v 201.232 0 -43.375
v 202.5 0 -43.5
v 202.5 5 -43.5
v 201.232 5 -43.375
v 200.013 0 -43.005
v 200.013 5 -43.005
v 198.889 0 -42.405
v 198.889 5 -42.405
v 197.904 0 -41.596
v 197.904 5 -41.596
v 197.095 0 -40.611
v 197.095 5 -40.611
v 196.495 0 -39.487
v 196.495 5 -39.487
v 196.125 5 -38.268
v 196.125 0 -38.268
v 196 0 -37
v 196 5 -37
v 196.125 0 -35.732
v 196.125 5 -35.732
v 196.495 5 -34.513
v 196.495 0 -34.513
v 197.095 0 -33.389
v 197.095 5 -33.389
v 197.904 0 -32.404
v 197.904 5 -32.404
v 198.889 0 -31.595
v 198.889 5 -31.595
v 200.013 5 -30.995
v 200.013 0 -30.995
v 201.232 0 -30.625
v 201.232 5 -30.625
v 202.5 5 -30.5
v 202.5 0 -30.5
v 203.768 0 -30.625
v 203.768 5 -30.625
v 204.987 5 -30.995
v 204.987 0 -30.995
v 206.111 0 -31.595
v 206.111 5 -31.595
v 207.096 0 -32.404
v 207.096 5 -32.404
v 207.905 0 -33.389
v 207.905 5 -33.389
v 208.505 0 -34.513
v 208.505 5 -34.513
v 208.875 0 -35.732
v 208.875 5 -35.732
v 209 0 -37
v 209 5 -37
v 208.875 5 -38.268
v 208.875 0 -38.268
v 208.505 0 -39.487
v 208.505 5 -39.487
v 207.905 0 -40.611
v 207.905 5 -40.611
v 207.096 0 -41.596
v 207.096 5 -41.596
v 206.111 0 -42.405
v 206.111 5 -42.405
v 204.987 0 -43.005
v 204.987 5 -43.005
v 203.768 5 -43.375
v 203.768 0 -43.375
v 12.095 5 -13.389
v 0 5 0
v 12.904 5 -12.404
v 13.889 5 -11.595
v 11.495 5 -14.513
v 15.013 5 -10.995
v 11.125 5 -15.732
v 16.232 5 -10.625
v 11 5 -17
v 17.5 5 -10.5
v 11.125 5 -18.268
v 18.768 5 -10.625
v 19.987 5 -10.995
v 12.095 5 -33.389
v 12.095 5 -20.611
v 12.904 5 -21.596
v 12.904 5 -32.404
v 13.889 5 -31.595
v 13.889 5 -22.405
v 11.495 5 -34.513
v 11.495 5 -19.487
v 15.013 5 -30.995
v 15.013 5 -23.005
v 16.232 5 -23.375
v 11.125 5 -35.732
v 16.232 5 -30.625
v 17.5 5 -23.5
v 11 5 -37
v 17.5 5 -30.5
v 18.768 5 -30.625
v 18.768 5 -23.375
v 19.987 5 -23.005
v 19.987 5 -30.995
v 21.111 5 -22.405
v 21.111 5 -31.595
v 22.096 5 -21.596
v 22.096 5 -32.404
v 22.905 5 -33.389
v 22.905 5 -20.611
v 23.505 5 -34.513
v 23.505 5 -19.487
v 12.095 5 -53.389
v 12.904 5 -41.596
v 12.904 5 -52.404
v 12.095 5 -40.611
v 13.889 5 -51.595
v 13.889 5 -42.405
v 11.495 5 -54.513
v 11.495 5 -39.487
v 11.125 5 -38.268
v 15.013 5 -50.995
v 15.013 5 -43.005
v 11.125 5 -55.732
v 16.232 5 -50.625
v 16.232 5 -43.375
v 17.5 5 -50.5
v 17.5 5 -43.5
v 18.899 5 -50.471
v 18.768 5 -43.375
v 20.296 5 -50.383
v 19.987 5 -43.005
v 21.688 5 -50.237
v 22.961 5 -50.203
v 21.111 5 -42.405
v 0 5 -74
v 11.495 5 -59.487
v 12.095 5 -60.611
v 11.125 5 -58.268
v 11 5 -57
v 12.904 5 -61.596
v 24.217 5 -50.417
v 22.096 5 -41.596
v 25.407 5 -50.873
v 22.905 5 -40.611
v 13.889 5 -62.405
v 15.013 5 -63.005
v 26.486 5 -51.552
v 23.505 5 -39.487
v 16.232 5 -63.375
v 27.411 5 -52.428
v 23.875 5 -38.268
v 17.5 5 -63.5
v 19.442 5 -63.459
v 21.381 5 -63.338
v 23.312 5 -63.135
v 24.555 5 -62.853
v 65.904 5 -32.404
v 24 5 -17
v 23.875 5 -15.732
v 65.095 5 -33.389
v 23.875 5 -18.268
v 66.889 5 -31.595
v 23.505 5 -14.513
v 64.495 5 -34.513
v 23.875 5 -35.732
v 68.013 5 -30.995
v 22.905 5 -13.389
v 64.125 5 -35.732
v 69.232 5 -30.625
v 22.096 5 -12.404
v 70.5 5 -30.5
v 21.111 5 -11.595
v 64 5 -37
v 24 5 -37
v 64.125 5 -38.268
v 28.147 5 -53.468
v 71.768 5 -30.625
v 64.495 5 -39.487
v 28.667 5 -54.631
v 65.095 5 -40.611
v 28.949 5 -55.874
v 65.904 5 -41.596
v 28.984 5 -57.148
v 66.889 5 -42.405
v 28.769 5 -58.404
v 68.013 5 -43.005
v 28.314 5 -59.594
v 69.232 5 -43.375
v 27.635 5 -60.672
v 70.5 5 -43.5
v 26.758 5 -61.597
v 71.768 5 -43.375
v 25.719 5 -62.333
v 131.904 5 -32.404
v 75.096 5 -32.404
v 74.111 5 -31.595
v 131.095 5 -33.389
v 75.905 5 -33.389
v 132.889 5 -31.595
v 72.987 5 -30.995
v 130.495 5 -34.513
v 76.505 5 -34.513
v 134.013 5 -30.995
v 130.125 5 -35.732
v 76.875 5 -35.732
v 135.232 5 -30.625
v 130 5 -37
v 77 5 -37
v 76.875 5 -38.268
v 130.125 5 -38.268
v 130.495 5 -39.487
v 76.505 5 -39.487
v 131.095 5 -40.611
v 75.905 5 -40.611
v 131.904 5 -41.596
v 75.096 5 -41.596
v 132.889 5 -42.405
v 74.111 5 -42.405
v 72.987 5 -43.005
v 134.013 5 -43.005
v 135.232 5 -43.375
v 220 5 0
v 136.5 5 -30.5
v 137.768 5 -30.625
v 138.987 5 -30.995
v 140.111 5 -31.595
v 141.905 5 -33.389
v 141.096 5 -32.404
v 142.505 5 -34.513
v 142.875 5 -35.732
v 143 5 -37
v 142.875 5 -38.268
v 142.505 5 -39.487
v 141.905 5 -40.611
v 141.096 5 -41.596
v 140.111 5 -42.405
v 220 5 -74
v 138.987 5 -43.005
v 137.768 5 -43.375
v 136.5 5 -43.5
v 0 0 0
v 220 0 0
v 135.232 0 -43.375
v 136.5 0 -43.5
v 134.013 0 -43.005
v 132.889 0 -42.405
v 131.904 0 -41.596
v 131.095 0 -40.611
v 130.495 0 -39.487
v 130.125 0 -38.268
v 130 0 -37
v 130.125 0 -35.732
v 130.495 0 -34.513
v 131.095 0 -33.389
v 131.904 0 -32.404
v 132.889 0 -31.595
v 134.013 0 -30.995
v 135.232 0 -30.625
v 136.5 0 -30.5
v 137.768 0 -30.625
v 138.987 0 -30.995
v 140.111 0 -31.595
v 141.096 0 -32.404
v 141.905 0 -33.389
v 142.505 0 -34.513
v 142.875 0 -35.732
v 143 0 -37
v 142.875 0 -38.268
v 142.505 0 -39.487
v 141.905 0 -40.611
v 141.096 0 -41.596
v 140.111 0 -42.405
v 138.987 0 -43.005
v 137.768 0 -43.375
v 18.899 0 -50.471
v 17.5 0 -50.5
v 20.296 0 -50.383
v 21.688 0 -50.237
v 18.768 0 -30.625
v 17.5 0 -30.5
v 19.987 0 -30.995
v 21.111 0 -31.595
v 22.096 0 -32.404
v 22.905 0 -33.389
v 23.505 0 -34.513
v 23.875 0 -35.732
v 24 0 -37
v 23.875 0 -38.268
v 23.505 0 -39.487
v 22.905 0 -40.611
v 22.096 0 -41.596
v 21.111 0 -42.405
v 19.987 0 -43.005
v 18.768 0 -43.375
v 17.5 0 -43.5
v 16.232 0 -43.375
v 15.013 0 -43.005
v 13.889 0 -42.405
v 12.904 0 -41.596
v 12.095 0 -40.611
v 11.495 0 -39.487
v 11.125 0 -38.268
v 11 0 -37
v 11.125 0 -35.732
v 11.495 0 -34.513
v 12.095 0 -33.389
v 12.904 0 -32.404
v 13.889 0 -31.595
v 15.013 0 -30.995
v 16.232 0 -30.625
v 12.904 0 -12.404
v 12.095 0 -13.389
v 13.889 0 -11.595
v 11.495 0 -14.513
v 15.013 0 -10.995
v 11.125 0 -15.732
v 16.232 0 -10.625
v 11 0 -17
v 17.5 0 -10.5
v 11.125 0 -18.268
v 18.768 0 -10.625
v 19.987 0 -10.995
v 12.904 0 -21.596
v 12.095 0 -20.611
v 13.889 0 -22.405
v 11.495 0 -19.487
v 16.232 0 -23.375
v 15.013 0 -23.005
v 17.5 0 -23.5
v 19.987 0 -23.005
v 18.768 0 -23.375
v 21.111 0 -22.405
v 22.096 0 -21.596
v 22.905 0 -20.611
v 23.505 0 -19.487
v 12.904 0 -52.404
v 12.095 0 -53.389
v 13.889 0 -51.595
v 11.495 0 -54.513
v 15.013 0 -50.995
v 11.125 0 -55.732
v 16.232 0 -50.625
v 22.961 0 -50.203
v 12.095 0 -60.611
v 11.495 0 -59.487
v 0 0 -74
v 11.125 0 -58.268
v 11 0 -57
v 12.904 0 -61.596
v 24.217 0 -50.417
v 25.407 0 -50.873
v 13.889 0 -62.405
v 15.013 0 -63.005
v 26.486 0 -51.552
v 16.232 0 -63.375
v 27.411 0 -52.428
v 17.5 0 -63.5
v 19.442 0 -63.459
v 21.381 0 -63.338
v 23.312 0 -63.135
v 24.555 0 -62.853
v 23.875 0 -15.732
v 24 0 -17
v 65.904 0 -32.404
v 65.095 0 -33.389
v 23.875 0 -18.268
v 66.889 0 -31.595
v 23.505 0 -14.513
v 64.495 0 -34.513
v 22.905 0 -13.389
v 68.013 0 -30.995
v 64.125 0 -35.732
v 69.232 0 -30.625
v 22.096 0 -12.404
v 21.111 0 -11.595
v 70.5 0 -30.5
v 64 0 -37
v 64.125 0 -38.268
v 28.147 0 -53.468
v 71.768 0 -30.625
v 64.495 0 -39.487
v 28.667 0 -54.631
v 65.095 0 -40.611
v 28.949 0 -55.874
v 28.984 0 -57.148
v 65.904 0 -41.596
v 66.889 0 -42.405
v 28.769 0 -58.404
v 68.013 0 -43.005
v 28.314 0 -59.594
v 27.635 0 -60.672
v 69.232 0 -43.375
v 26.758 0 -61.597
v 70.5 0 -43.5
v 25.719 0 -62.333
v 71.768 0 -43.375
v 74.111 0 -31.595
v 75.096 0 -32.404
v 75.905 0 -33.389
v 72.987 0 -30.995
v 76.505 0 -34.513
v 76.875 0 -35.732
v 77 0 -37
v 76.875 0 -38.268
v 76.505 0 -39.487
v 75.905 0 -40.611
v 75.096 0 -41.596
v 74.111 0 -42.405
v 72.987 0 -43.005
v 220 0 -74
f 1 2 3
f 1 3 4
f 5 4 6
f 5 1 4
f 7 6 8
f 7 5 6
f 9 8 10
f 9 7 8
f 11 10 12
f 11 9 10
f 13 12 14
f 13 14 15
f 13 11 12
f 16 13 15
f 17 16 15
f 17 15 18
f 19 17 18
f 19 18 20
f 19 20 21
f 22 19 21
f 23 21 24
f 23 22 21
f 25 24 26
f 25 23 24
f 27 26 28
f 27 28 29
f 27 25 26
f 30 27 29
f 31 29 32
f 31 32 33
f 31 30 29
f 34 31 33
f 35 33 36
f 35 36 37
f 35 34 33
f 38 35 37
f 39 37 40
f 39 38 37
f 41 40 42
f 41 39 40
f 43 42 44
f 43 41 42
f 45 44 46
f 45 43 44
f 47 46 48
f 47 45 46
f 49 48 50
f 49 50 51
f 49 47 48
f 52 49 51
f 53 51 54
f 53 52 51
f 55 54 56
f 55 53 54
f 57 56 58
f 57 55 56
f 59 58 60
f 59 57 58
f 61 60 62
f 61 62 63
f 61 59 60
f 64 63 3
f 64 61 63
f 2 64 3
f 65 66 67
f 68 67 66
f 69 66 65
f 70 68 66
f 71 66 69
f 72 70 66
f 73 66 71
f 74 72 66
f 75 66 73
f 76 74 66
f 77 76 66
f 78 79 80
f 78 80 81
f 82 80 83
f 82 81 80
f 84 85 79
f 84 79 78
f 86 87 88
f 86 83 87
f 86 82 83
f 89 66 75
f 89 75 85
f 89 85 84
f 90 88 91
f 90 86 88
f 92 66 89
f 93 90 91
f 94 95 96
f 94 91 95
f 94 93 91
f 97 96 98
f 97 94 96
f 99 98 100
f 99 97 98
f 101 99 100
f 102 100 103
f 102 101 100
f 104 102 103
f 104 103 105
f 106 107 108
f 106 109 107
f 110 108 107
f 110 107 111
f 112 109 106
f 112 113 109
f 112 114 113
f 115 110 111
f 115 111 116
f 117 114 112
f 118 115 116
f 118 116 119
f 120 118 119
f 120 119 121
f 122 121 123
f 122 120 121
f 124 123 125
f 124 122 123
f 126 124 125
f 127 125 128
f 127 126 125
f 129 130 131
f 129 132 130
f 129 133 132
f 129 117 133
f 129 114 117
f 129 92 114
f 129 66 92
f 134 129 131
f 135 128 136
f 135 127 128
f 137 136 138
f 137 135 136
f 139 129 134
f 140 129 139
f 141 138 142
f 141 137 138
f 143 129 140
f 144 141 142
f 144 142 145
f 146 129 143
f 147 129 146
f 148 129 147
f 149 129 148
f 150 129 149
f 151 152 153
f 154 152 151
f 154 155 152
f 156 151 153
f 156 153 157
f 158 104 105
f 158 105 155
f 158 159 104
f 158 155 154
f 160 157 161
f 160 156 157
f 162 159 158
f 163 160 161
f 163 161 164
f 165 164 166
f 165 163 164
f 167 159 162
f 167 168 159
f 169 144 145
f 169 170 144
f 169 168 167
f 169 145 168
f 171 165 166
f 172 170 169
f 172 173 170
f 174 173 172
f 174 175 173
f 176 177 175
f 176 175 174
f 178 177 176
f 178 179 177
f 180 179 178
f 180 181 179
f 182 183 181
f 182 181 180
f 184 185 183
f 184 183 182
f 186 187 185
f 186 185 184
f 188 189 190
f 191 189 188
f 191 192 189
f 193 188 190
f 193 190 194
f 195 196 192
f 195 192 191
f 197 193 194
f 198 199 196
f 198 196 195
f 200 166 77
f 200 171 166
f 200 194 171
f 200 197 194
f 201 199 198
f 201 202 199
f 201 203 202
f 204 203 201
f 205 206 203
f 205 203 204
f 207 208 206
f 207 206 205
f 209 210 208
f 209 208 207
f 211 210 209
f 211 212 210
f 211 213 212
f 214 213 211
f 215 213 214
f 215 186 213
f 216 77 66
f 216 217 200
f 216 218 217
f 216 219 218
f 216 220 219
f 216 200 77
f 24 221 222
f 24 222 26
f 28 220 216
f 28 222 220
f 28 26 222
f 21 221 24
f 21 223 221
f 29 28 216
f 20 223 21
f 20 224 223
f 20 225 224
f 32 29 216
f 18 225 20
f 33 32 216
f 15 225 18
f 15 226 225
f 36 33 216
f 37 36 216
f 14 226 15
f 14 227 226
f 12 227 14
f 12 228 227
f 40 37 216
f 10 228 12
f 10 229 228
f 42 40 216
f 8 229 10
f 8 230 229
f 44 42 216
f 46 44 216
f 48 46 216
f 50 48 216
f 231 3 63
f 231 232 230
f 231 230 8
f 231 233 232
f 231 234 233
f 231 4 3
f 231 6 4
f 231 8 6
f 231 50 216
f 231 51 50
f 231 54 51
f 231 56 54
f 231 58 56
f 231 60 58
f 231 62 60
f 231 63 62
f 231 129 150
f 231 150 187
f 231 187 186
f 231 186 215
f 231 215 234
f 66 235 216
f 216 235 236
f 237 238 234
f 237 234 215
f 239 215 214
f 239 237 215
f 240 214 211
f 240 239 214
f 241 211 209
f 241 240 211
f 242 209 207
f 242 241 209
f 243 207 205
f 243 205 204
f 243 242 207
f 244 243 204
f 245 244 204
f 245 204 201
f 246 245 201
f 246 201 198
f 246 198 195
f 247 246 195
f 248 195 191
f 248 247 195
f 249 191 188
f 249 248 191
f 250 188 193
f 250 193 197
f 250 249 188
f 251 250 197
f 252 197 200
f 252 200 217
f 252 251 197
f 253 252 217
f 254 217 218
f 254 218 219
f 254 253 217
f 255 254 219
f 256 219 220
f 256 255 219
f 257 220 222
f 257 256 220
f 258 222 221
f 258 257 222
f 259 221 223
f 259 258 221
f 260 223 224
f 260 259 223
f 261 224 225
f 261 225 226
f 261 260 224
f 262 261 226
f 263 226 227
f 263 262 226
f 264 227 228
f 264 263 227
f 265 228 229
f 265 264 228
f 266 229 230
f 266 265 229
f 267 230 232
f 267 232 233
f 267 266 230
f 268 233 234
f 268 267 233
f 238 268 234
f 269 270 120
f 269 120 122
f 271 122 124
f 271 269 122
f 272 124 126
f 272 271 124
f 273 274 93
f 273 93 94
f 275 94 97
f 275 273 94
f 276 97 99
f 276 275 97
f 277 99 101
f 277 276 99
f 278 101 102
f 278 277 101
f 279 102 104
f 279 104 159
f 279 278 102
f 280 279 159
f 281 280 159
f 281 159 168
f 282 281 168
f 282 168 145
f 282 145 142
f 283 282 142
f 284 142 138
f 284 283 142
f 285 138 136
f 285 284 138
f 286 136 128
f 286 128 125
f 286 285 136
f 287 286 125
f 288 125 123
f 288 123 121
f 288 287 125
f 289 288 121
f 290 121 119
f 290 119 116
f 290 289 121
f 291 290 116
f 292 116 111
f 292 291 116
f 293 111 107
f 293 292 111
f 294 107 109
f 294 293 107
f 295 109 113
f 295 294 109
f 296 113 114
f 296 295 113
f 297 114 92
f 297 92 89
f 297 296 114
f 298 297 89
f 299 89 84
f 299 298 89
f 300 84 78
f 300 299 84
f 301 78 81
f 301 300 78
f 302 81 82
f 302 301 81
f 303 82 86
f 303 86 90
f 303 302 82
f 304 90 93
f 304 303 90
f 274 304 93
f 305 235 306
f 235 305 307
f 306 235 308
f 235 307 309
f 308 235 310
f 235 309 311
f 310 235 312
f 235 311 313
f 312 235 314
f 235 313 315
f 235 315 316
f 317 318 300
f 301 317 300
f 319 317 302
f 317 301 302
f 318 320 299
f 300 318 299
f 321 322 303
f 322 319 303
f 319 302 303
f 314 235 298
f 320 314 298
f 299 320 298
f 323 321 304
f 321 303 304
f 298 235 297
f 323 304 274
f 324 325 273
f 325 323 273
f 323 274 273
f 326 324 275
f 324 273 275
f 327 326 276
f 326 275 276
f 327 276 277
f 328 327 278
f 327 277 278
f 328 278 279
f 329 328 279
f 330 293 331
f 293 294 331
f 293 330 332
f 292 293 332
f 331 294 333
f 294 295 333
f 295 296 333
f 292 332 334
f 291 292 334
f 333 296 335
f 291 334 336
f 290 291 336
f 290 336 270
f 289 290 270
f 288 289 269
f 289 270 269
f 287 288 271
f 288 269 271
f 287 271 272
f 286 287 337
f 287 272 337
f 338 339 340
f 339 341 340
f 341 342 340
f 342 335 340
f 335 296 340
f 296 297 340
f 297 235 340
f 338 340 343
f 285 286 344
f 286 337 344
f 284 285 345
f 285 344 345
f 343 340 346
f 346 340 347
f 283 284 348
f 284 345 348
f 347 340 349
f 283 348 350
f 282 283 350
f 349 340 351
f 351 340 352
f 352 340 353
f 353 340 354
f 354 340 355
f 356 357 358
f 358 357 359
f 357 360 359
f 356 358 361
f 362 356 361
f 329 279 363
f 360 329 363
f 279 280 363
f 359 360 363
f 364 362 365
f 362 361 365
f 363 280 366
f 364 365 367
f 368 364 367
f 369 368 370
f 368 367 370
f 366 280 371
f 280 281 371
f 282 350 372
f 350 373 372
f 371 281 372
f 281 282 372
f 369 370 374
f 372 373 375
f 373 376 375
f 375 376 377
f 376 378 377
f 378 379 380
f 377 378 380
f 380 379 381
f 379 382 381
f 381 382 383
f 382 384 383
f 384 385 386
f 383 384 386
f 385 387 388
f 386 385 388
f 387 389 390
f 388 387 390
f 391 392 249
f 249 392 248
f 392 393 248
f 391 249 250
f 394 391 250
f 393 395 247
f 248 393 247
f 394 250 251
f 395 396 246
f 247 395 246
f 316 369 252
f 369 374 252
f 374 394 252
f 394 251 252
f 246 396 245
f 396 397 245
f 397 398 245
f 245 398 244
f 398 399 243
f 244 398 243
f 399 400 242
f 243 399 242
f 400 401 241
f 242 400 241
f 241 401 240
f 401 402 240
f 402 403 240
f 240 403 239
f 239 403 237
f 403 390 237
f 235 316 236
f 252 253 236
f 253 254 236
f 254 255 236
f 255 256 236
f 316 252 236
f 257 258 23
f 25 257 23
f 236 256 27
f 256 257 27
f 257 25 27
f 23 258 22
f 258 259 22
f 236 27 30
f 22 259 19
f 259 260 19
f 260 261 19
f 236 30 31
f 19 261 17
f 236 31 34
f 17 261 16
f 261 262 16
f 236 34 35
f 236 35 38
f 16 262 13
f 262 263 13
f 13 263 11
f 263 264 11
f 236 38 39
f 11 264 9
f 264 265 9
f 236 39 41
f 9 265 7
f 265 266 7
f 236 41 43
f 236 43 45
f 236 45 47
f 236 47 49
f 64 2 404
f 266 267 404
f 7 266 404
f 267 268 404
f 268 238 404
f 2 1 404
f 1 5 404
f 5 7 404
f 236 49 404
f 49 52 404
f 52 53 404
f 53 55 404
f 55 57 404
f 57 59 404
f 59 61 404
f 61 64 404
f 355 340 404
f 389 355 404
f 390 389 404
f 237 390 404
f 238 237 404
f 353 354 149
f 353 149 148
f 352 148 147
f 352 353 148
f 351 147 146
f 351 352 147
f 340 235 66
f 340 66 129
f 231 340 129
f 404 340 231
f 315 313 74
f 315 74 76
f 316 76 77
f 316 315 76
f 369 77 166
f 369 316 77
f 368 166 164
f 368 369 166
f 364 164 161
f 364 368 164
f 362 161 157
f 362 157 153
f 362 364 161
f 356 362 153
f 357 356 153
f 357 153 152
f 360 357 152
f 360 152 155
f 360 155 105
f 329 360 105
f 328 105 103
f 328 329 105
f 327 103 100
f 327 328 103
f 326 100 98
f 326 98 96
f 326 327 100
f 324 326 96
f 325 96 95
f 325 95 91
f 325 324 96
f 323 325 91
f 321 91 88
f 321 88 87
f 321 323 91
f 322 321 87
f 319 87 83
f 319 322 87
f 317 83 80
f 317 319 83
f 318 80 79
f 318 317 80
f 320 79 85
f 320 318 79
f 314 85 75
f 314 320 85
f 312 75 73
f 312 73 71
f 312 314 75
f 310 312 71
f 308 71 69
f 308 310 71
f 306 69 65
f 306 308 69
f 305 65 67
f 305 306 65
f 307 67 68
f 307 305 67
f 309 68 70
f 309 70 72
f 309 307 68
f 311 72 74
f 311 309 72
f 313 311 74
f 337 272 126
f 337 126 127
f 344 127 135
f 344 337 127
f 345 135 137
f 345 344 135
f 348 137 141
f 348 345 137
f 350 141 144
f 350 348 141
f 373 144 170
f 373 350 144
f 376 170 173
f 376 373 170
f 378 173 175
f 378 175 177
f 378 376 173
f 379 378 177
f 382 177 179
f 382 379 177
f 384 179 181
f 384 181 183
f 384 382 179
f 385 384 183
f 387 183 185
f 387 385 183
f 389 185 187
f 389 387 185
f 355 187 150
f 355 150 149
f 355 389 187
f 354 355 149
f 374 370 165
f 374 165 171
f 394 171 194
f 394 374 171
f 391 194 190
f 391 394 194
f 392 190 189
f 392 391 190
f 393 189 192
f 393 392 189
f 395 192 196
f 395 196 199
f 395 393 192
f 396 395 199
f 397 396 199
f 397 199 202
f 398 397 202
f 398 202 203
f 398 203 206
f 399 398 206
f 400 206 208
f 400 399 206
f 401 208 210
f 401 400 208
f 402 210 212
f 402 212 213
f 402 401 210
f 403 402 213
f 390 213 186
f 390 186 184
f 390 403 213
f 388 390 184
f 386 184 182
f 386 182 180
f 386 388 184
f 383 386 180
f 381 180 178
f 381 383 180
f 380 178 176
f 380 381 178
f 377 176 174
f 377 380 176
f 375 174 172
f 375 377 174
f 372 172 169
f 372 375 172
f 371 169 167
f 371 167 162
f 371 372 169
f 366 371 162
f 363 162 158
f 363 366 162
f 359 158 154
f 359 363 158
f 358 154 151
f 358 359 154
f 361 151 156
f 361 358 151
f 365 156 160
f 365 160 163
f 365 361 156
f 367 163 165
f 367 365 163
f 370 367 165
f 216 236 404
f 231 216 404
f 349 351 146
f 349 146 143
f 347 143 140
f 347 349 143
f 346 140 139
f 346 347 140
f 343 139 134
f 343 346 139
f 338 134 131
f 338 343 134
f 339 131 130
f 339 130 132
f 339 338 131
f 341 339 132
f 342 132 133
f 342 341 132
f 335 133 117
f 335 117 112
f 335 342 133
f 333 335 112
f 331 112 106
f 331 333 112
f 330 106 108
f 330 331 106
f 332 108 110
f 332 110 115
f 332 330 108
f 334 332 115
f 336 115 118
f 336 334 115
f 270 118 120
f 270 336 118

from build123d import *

# Parameters (mm, degrees)
SZKIC1_W                    = 220
SZKIC1_H                    = 74
SZKIC1_R                    = 6.5
DODANIE_WYCI_GNI_CIE1_DEPTH = 5


with BuildPart() as part:
    # Szkic1 → Dodanie-wyciągnięcie1 (new body)
    with BuildSketch(Plane(origin=(0, 0, 0), x_dir=(1, 0, 0), z_dir=(0, 1, 0))):
        with Locations((110, 37)):
            Rectangle(SZKIC1_W, SZKIC1_H)
        with Locations(Location((17.5, 37, 0), (0, 0, 270))):
            Circle(SZKIC1_R, mode=Mode.SUBTRACT)
        with Locations(Location((70.5, 37, 0), (0, 0, 270))):
            Circle(SZKIC1_R, mode=Mode.SUBTRACT)
        with Locations(Location((202.5, 37, 0), (0, 0, 90))):
            Circle(SZKIC1_R, mode=Mode.SUBTRACT)
        with Locations(Location((136.5, 37, 0), (0, 0, 90))):
            Circle(SZKIC1_R, mode=Mode.SUBTRACT)
        with Locations(Location((17.5, 17, 0), (0, 0, 270))):
            Circle(SZKIC1_R, mode=Mode.SUBTRACT)
        with BuildLine():
            ThreePointArc((17.5, 63.5), (11, 57), (17.5, 50.5))
            ThreePointArc((17.5, 50.5), (19.59786757, 50.434248184), (21.6875, 50.237250845))
            ThreePointArc((21.6875, 50.237250845), (28.949018821, 55.873769666), (23.3125, 63.135288487))
            ThreePointArc((23.3125, 63.135288487), (20.411965433, 63.408732555), (17.5, 63.5))
        make_face(mode=Mode.SUBTRACT)
    extrude(amount=DODANIE_WYCI_GNI_CIE1_DEPTH)


solid = part.part
